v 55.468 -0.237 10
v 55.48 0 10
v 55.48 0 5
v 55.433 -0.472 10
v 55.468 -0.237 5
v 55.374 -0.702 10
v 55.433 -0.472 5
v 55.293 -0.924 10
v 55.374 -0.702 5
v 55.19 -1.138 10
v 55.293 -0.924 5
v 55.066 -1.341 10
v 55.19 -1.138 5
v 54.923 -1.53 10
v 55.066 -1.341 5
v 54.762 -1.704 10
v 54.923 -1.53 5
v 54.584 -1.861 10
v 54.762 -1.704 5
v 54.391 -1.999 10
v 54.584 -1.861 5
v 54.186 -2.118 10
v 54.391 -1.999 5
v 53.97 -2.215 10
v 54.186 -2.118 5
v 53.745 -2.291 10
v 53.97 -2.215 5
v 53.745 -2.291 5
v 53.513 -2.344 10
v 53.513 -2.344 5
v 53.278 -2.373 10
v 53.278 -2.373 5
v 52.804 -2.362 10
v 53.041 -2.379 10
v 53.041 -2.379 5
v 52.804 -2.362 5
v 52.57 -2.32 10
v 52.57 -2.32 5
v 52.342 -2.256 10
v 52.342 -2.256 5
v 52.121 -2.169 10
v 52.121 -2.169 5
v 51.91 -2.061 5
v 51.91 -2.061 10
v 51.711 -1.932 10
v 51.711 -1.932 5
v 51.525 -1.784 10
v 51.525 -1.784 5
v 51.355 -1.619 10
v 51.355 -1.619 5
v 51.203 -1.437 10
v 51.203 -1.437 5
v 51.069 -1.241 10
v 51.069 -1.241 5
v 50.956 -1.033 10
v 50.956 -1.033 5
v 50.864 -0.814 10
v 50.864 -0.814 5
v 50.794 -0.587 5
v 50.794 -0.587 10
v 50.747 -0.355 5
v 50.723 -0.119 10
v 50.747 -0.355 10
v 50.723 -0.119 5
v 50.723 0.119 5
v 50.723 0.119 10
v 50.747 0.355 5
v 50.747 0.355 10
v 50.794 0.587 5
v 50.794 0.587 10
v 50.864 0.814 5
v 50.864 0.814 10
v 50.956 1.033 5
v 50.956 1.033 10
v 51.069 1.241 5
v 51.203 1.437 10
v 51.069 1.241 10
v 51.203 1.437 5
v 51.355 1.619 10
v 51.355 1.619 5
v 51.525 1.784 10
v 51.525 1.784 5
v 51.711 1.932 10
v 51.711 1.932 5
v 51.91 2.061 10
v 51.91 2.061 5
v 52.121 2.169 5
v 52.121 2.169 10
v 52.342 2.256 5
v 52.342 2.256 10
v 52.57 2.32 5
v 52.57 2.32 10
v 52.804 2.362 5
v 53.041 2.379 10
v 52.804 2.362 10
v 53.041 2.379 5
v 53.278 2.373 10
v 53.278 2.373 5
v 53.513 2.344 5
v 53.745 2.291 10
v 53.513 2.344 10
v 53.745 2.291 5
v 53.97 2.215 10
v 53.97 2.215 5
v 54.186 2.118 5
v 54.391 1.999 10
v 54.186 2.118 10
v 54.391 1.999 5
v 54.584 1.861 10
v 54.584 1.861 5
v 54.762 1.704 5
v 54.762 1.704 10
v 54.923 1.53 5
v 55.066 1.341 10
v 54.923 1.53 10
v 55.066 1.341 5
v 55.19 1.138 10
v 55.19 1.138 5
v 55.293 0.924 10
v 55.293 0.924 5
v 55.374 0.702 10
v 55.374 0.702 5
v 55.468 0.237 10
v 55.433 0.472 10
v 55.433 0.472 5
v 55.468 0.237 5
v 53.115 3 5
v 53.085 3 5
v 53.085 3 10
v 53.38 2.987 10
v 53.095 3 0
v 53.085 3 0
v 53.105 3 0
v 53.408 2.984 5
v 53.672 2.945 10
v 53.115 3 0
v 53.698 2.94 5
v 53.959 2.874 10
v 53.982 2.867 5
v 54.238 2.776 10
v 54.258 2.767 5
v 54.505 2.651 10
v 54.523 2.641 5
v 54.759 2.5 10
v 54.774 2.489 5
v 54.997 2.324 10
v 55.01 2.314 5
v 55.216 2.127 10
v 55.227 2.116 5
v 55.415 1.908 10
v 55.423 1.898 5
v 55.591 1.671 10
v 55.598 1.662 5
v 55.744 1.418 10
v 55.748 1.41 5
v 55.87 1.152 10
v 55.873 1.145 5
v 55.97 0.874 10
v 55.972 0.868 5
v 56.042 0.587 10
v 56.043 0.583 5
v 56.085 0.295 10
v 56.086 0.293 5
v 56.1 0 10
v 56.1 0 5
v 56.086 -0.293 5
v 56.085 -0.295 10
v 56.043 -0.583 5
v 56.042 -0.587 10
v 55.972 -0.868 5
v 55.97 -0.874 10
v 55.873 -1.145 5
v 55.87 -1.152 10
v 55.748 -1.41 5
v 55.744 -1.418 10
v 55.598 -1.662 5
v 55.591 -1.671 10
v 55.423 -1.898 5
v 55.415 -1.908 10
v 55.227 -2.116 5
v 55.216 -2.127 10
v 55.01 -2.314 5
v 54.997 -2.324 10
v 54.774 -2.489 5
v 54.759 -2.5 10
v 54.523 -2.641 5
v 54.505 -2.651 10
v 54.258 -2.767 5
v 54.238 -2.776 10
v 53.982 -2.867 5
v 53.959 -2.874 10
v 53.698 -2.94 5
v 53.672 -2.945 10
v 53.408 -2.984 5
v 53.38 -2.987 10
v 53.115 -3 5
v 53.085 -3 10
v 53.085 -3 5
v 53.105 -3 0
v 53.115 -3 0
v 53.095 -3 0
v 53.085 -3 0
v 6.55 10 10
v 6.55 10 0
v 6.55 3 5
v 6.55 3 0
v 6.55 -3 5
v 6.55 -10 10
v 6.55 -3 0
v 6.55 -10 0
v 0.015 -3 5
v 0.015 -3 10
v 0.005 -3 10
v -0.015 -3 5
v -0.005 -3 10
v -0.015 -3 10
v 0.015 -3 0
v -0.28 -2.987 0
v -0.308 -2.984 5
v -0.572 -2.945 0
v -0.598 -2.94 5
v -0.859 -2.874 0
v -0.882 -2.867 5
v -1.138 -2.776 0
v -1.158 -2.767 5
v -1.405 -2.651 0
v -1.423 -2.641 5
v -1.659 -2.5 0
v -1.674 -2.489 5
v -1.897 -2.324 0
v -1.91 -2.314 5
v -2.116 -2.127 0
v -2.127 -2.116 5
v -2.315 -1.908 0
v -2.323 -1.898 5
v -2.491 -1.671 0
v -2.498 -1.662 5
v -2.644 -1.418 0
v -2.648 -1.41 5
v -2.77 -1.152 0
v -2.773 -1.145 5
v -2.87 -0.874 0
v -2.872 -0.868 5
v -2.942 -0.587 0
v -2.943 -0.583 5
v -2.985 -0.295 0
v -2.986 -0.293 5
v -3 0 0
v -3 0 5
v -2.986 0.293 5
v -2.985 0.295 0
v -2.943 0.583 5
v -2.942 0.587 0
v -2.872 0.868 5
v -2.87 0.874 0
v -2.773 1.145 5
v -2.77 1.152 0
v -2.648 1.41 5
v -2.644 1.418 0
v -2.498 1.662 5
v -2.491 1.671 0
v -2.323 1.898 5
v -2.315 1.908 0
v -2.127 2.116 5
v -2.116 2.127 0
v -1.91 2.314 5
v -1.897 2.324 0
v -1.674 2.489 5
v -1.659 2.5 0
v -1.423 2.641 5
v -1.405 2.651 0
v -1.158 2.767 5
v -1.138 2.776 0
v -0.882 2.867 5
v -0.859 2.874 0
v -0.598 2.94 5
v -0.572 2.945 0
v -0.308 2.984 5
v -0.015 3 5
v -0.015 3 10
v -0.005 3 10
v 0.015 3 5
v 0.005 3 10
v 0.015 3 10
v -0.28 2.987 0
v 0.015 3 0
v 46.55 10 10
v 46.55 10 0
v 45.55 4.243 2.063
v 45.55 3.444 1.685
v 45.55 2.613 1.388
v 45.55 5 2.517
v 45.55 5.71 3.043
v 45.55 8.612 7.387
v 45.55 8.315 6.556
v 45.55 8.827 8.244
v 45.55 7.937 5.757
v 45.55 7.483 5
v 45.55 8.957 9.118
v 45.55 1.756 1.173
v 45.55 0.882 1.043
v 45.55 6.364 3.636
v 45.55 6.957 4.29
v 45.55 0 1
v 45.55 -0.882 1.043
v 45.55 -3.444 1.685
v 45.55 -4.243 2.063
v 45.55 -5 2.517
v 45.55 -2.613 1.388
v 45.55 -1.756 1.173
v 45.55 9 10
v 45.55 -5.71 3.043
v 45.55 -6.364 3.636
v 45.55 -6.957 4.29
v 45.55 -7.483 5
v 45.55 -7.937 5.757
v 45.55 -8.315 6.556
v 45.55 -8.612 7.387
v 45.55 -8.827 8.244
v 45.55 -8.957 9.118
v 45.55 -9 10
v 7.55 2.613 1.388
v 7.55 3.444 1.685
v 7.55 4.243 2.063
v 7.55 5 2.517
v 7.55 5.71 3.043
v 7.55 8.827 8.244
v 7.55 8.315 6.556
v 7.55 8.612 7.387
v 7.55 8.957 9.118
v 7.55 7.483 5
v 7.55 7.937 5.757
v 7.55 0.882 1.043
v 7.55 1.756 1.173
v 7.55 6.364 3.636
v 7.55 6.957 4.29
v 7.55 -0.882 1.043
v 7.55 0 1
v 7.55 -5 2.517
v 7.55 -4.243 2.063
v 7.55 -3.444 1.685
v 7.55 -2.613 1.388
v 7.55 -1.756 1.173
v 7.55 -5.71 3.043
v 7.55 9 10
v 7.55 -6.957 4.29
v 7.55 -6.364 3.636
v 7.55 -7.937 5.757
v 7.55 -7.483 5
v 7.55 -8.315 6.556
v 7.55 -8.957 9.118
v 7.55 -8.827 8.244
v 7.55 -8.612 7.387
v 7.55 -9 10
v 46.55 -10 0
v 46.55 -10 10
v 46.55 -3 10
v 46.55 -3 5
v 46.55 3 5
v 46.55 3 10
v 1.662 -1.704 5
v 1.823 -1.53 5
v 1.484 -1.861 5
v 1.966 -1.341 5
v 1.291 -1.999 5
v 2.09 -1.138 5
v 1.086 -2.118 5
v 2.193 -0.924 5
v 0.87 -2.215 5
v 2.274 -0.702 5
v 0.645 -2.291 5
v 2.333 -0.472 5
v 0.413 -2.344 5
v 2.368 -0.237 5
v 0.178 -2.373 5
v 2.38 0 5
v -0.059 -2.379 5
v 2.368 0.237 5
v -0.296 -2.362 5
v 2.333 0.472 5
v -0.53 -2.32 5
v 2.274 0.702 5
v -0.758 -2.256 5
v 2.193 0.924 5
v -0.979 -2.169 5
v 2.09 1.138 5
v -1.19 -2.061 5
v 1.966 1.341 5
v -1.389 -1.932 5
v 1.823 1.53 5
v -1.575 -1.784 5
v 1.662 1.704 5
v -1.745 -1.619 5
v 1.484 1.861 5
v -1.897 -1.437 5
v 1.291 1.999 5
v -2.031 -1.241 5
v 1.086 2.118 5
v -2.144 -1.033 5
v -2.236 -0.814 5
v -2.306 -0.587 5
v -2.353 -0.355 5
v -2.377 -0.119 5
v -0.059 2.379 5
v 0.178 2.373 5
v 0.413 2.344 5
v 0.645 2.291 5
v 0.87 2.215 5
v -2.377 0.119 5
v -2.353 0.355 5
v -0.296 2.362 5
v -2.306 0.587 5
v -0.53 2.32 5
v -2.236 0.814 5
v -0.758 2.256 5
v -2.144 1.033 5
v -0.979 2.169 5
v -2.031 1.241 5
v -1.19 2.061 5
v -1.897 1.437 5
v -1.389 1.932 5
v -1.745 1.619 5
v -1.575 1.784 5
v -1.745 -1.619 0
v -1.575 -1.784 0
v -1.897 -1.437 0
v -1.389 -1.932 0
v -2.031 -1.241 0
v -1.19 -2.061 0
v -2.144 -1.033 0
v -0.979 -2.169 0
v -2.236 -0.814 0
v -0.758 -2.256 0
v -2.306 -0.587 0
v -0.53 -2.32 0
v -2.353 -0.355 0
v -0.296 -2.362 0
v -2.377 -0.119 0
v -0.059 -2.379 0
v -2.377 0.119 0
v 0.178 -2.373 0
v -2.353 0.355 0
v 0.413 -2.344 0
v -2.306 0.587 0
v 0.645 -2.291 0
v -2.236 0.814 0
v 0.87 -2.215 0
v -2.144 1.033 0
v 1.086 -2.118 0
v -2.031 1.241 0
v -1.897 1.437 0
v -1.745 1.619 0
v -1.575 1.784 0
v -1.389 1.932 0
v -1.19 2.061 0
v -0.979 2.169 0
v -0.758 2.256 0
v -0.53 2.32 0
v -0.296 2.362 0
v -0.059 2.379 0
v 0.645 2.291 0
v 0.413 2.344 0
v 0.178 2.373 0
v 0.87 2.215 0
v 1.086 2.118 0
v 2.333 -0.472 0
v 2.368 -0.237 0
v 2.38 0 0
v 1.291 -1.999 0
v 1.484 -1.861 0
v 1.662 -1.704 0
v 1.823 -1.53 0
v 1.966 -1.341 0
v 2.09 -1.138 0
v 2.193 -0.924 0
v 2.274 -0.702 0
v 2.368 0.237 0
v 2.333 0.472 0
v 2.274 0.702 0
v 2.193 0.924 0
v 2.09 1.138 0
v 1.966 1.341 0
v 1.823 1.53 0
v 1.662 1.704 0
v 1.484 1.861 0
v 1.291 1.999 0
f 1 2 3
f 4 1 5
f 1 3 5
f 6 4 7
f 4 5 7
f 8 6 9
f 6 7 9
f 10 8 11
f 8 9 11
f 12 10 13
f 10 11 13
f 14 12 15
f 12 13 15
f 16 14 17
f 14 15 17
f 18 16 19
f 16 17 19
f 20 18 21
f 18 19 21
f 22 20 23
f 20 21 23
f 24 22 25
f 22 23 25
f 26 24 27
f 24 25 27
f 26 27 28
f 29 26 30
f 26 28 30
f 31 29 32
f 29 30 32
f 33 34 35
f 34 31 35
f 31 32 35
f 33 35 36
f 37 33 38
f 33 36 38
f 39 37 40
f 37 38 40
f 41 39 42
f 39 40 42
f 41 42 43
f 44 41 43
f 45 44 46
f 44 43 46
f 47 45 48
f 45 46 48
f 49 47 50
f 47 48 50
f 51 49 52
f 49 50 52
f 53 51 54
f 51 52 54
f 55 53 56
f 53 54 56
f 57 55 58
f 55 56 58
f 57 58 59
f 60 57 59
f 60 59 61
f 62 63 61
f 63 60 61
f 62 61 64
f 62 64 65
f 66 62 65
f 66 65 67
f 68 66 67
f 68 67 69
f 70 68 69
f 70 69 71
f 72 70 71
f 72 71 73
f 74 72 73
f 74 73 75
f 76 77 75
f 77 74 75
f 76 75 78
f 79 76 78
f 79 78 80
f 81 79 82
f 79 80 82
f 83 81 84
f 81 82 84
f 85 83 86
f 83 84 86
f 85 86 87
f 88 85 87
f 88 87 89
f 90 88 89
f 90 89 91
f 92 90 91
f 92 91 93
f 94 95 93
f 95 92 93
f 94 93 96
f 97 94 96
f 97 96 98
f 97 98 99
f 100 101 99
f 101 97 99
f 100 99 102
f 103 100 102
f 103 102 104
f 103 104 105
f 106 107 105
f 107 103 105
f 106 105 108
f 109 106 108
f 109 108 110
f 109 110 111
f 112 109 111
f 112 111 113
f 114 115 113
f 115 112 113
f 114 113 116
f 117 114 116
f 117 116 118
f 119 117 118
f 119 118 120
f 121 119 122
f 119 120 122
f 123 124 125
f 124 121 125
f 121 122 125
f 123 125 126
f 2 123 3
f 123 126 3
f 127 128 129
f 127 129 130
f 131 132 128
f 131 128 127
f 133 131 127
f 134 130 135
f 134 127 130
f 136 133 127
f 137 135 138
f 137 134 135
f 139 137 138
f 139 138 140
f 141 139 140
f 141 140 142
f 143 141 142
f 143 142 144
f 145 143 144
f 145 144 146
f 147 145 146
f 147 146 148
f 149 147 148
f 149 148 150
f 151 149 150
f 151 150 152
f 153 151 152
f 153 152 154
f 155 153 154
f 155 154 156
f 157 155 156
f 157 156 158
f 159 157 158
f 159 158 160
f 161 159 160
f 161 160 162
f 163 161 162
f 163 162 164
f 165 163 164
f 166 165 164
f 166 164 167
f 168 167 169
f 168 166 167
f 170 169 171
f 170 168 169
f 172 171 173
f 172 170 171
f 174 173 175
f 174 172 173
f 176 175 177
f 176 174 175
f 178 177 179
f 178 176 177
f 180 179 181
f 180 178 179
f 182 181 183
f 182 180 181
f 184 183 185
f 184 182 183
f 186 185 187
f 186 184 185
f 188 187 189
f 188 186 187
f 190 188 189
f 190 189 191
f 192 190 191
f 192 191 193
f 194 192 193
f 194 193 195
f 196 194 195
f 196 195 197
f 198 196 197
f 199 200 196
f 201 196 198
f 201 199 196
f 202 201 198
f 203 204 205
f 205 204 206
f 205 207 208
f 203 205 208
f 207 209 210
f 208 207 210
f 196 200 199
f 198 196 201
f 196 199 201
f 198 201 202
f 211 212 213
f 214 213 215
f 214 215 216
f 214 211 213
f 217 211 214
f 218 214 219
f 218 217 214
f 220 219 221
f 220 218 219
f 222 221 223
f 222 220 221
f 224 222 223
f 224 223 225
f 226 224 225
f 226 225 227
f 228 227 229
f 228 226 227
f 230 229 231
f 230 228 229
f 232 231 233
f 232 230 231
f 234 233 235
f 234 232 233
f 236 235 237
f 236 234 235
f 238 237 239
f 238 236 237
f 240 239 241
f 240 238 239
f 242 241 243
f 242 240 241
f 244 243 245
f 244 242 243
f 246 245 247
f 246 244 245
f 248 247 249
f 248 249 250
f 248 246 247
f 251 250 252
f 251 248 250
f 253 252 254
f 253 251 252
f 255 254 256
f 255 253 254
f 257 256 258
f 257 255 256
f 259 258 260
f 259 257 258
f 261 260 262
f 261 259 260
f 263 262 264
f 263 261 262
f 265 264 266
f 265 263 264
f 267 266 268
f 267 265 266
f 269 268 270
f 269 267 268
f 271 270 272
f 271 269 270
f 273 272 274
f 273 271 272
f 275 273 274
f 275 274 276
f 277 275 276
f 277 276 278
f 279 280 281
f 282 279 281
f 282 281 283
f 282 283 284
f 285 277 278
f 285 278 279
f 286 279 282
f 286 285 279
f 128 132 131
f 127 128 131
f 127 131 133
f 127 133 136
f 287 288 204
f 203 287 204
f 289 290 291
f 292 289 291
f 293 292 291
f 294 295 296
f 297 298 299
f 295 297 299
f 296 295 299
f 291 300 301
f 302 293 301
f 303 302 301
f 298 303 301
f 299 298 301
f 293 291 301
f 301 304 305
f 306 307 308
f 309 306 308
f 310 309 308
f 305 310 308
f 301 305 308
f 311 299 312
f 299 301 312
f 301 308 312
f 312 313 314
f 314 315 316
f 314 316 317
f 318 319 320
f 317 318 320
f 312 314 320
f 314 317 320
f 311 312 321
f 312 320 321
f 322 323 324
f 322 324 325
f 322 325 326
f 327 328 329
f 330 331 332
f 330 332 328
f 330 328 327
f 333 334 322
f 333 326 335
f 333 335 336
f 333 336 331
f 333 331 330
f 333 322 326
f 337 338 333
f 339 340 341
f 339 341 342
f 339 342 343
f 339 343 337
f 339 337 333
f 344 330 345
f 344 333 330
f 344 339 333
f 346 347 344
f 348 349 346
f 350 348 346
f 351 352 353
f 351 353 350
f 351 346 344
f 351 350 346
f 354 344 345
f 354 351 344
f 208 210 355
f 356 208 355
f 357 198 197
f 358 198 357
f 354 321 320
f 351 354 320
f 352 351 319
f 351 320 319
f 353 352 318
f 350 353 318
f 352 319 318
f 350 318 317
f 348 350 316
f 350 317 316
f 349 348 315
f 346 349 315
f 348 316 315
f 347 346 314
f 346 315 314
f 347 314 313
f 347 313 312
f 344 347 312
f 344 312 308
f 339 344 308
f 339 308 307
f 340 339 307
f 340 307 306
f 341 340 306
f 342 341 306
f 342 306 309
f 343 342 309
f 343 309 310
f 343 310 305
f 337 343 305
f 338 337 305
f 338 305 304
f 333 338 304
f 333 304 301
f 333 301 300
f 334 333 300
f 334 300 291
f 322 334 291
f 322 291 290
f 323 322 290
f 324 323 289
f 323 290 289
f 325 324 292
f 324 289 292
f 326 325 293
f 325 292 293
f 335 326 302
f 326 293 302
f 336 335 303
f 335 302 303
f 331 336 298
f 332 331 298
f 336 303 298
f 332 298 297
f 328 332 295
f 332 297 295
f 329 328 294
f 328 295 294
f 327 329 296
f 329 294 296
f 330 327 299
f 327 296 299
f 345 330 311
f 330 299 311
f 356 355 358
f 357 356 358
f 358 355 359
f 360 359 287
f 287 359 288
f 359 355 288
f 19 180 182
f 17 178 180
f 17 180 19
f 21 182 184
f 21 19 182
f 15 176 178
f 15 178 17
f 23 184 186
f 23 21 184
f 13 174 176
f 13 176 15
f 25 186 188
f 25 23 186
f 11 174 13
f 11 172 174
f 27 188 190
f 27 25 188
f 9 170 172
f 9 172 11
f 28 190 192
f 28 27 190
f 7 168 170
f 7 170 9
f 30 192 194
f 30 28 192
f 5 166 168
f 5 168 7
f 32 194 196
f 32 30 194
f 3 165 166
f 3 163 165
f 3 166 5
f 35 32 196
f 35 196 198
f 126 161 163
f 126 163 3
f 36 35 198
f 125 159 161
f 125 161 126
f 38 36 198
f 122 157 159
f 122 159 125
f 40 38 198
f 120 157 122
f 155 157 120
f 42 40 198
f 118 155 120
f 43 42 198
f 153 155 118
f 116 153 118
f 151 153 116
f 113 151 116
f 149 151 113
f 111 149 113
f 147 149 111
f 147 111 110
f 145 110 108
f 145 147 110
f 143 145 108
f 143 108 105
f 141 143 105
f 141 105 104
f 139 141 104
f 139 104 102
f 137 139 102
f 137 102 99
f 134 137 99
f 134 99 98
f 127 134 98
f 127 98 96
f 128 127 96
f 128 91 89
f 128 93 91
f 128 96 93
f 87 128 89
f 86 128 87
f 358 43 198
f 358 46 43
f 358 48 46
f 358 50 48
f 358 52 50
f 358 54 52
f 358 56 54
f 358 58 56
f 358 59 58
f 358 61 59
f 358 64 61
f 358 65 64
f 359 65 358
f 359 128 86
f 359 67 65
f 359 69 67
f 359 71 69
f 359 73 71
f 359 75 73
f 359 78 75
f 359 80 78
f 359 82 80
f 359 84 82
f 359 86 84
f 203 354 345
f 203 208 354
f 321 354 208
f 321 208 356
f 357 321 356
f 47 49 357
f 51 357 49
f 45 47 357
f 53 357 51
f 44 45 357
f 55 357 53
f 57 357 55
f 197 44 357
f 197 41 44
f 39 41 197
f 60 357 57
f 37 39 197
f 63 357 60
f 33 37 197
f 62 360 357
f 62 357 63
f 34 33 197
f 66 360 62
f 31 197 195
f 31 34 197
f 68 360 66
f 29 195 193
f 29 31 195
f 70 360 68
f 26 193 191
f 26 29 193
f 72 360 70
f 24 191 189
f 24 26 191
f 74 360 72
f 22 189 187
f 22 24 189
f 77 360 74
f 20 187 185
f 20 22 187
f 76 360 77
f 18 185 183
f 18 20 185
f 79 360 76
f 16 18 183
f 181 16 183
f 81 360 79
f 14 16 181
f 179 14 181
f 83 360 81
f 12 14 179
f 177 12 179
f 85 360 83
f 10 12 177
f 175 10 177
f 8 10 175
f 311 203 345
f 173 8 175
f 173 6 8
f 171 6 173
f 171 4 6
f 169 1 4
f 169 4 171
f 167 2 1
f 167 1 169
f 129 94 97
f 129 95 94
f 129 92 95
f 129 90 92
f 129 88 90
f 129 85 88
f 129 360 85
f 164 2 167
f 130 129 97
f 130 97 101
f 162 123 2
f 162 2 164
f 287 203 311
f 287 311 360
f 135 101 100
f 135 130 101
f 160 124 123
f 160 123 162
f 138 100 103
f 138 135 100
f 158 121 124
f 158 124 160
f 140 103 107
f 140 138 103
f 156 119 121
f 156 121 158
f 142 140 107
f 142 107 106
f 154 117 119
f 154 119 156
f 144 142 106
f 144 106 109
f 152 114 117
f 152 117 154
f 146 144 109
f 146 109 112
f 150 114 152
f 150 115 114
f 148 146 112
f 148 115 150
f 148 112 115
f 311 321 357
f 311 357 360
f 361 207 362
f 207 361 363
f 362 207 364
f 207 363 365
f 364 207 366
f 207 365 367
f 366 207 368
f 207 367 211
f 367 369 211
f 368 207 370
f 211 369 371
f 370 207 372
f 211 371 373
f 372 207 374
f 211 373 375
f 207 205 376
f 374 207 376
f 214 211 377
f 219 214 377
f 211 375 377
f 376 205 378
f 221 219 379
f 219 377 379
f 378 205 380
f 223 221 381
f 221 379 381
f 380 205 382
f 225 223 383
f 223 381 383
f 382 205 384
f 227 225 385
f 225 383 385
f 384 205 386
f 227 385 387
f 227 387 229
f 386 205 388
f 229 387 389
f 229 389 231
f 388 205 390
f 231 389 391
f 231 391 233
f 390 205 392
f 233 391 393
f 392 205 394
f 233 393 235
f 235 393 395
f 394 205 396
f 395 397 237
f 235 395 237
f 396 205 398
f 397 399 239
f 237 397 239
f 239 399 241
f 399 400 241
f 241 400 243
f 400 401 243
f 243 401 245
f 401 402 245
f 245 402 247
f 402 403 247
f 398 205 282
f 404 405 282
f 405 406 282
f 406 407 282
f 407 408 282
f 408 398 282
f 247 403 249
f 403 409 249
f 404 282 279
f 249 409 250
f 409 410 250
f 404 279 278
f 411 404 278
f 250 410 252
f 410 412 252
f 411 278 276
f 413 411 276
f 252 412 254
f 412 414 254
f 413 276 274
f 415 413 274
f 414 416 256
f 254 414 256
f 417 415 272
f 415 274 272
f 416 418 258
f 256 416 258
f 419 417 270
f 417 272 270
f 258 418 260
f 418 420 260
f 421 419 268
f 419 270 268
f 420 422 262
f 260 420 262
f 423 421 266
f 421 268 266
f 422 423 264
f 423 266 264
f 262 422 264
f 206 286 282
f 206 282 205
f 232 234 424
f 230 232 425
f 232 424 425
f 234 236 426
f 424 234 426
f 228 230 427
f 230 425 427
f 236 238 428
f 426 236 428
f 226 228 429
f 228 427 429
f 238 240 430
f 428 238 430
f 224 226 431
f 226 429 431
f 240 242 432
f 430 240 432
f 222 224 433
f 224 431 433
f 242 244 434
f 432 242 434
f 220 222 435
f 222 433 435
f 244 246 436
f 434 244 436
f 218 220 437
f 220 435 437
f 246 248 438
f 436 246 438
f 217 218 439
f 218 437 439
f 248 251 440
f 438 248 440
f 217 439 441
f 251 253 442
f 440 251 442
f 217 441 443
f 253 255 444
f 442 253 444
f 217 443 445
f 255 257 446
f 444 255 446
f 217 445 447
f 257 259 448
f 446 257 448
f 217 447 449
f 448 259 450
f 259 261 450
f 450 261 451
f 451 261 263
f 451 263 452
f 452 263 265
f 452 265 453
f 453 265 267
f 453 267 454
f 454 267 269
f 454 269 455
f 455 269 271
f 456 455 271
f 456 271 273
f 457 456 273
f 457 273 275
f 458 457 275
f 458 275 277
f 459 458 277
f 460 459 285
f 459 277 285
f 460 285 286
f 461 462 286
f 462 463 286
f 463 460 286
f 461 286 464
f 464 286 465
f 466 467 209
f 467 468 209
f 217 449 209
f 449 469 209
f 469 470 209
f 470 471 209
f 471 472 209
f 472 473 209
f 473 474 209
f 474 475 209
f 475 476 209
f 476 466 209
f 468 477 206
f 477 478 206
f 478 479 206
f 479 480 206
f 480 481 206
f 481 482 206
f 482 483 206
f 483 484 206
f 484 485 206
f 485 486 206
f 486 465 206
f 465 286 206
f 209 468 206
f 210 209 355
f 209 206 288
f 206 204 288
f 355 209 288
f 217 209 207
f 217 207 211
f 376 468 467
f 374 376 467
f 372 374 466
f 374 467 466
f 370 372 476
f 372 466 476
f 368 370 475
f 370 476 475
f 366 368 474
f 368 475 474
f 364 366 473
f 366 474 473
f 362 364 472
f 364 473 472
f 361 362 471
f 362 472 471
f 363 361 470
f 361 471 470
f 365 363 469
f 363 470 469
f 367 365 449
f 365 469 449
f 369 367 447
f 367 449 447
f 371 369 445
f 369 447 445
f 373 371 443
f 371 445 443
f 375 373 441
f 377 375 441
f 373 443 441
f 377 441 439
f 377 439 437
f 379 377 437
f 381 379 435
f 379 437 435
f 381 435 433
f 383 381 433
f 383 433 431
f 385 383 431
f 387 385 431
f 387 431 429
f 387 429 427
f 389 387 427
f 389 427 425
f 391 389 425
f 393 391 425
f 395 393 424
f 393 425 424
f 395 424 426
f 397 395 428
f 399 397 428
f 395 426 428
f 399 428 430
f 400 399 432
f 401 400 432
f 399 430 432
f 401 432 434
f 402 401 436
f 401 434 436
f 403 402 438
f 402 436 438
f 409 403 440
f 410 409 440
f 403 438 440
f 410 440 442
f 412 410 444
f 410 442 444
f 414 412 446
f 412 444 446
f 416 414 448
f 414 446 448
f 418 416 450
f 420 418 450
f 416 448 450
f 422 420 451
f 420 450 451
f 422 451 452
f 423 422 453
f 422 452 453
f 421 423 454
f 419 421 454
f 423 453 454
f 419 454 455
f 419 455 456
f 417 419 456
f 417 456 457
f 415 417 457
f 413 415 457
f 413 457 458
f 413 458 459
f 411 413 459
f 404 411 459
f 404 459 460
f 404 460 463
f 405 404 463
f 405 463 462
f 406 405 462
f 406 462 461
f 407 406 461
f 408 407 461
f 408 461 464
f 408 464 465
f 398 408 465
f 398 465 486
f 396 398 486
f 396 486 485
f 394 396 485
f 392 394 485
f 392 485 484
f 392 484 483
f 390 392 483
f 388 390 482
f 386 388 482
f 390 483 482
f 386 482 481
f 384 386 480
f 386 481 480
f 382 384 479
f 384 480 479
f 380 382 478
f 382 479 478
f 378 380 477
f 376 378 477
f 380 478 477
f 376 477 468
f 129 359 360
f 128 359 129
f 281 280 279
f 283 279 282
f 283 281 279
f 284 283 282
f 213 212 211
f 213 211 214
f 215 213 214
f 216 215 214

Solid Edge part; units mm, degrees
sketch "Sketch1" plane through (0, 0, 0) normal (0, 0, 1) x (1, 0, 0)
  line L0 (6.55, 10) -> (6.55, 2.999963)
  line L1 (0.014946, 2.999963) -> (6.55, 2.999963)
  line L2 (6.55, -2.999963) -> (0.014946, -2.999963)
  line L3 (6.55, -2.999963) -> (6.55, -10)
  line L4 (6.55, -10) -> (46.55, -10)
  line L5 (46.55, -10) -> (46.55, -2.999963)
  line L6 (53.085054, -2.999963) -> (46.55, -2.999963)
  line L7 (46.55, 2.999963) -> (53.085054, 2.999963)
  line L8 (46.55, 2.999963) -> (46.55, 10)
  line L9 (46.55, 10) -> (6.55, 10)
  arc A0 (0.0149, -2.999963) -> (0.0149, 2.999963) centre (0, 0) cw
  arc A1 (53.0851, 2.999963) -> (53.0851, -2.999963) centre (53.1, 0) cw
  circle A2 centre (0, 0) radius 2.38
  circle A3 centre (53.1, 0) radius 2.38
extrude "Protrusion1" add sketch "Sketch1" along normal blind 10
sketch "Sketch2" plane through (45.55, -6.499981, 5) normal (1, 0, 0) x (0, 1, 0)
  circle A0 centre (6.499981, 5) radius 9
extrude "ExtrudedCutout_1" cut sketch "Sketch2" against normal blind 38
sketch "Sketch3" plane through (26.55, 0, 0) normal (0, 0, -1) x (1, 0, 0)
  line L0 (29.55, -2.999963) -> (29.55, 2.999963)
  line L1 (29.55, 2.999963) -> (20, 2.999963)
  line L2 (20, 2.999963) -> (20, -2.999963)
  line L3 (20, -2.999963) -> (29.55, -2.999963)
extrude "ExtrudedCutout_2" cut sketch "Sketch3" against normal blind 5
sketch "Sketch4" plane through (26.55, 0, 10) normal (0, 0, 1) x (1, 0, 0)
  line L0 (-20, -2.999963) -> (-29.835403, -2.999963)
  line L1 (-29.835403, -2.999963) -> (-29.835403, 2.999963)
  line L2 (-29.835403, 2.999963) -> (-20, 2.999963)
  line L3 (-20, 2.999963) -> (-20, -2.999963)
extrude "ExtrudedCutout_3" cut sketch "Sketch4" against normal blind 5
